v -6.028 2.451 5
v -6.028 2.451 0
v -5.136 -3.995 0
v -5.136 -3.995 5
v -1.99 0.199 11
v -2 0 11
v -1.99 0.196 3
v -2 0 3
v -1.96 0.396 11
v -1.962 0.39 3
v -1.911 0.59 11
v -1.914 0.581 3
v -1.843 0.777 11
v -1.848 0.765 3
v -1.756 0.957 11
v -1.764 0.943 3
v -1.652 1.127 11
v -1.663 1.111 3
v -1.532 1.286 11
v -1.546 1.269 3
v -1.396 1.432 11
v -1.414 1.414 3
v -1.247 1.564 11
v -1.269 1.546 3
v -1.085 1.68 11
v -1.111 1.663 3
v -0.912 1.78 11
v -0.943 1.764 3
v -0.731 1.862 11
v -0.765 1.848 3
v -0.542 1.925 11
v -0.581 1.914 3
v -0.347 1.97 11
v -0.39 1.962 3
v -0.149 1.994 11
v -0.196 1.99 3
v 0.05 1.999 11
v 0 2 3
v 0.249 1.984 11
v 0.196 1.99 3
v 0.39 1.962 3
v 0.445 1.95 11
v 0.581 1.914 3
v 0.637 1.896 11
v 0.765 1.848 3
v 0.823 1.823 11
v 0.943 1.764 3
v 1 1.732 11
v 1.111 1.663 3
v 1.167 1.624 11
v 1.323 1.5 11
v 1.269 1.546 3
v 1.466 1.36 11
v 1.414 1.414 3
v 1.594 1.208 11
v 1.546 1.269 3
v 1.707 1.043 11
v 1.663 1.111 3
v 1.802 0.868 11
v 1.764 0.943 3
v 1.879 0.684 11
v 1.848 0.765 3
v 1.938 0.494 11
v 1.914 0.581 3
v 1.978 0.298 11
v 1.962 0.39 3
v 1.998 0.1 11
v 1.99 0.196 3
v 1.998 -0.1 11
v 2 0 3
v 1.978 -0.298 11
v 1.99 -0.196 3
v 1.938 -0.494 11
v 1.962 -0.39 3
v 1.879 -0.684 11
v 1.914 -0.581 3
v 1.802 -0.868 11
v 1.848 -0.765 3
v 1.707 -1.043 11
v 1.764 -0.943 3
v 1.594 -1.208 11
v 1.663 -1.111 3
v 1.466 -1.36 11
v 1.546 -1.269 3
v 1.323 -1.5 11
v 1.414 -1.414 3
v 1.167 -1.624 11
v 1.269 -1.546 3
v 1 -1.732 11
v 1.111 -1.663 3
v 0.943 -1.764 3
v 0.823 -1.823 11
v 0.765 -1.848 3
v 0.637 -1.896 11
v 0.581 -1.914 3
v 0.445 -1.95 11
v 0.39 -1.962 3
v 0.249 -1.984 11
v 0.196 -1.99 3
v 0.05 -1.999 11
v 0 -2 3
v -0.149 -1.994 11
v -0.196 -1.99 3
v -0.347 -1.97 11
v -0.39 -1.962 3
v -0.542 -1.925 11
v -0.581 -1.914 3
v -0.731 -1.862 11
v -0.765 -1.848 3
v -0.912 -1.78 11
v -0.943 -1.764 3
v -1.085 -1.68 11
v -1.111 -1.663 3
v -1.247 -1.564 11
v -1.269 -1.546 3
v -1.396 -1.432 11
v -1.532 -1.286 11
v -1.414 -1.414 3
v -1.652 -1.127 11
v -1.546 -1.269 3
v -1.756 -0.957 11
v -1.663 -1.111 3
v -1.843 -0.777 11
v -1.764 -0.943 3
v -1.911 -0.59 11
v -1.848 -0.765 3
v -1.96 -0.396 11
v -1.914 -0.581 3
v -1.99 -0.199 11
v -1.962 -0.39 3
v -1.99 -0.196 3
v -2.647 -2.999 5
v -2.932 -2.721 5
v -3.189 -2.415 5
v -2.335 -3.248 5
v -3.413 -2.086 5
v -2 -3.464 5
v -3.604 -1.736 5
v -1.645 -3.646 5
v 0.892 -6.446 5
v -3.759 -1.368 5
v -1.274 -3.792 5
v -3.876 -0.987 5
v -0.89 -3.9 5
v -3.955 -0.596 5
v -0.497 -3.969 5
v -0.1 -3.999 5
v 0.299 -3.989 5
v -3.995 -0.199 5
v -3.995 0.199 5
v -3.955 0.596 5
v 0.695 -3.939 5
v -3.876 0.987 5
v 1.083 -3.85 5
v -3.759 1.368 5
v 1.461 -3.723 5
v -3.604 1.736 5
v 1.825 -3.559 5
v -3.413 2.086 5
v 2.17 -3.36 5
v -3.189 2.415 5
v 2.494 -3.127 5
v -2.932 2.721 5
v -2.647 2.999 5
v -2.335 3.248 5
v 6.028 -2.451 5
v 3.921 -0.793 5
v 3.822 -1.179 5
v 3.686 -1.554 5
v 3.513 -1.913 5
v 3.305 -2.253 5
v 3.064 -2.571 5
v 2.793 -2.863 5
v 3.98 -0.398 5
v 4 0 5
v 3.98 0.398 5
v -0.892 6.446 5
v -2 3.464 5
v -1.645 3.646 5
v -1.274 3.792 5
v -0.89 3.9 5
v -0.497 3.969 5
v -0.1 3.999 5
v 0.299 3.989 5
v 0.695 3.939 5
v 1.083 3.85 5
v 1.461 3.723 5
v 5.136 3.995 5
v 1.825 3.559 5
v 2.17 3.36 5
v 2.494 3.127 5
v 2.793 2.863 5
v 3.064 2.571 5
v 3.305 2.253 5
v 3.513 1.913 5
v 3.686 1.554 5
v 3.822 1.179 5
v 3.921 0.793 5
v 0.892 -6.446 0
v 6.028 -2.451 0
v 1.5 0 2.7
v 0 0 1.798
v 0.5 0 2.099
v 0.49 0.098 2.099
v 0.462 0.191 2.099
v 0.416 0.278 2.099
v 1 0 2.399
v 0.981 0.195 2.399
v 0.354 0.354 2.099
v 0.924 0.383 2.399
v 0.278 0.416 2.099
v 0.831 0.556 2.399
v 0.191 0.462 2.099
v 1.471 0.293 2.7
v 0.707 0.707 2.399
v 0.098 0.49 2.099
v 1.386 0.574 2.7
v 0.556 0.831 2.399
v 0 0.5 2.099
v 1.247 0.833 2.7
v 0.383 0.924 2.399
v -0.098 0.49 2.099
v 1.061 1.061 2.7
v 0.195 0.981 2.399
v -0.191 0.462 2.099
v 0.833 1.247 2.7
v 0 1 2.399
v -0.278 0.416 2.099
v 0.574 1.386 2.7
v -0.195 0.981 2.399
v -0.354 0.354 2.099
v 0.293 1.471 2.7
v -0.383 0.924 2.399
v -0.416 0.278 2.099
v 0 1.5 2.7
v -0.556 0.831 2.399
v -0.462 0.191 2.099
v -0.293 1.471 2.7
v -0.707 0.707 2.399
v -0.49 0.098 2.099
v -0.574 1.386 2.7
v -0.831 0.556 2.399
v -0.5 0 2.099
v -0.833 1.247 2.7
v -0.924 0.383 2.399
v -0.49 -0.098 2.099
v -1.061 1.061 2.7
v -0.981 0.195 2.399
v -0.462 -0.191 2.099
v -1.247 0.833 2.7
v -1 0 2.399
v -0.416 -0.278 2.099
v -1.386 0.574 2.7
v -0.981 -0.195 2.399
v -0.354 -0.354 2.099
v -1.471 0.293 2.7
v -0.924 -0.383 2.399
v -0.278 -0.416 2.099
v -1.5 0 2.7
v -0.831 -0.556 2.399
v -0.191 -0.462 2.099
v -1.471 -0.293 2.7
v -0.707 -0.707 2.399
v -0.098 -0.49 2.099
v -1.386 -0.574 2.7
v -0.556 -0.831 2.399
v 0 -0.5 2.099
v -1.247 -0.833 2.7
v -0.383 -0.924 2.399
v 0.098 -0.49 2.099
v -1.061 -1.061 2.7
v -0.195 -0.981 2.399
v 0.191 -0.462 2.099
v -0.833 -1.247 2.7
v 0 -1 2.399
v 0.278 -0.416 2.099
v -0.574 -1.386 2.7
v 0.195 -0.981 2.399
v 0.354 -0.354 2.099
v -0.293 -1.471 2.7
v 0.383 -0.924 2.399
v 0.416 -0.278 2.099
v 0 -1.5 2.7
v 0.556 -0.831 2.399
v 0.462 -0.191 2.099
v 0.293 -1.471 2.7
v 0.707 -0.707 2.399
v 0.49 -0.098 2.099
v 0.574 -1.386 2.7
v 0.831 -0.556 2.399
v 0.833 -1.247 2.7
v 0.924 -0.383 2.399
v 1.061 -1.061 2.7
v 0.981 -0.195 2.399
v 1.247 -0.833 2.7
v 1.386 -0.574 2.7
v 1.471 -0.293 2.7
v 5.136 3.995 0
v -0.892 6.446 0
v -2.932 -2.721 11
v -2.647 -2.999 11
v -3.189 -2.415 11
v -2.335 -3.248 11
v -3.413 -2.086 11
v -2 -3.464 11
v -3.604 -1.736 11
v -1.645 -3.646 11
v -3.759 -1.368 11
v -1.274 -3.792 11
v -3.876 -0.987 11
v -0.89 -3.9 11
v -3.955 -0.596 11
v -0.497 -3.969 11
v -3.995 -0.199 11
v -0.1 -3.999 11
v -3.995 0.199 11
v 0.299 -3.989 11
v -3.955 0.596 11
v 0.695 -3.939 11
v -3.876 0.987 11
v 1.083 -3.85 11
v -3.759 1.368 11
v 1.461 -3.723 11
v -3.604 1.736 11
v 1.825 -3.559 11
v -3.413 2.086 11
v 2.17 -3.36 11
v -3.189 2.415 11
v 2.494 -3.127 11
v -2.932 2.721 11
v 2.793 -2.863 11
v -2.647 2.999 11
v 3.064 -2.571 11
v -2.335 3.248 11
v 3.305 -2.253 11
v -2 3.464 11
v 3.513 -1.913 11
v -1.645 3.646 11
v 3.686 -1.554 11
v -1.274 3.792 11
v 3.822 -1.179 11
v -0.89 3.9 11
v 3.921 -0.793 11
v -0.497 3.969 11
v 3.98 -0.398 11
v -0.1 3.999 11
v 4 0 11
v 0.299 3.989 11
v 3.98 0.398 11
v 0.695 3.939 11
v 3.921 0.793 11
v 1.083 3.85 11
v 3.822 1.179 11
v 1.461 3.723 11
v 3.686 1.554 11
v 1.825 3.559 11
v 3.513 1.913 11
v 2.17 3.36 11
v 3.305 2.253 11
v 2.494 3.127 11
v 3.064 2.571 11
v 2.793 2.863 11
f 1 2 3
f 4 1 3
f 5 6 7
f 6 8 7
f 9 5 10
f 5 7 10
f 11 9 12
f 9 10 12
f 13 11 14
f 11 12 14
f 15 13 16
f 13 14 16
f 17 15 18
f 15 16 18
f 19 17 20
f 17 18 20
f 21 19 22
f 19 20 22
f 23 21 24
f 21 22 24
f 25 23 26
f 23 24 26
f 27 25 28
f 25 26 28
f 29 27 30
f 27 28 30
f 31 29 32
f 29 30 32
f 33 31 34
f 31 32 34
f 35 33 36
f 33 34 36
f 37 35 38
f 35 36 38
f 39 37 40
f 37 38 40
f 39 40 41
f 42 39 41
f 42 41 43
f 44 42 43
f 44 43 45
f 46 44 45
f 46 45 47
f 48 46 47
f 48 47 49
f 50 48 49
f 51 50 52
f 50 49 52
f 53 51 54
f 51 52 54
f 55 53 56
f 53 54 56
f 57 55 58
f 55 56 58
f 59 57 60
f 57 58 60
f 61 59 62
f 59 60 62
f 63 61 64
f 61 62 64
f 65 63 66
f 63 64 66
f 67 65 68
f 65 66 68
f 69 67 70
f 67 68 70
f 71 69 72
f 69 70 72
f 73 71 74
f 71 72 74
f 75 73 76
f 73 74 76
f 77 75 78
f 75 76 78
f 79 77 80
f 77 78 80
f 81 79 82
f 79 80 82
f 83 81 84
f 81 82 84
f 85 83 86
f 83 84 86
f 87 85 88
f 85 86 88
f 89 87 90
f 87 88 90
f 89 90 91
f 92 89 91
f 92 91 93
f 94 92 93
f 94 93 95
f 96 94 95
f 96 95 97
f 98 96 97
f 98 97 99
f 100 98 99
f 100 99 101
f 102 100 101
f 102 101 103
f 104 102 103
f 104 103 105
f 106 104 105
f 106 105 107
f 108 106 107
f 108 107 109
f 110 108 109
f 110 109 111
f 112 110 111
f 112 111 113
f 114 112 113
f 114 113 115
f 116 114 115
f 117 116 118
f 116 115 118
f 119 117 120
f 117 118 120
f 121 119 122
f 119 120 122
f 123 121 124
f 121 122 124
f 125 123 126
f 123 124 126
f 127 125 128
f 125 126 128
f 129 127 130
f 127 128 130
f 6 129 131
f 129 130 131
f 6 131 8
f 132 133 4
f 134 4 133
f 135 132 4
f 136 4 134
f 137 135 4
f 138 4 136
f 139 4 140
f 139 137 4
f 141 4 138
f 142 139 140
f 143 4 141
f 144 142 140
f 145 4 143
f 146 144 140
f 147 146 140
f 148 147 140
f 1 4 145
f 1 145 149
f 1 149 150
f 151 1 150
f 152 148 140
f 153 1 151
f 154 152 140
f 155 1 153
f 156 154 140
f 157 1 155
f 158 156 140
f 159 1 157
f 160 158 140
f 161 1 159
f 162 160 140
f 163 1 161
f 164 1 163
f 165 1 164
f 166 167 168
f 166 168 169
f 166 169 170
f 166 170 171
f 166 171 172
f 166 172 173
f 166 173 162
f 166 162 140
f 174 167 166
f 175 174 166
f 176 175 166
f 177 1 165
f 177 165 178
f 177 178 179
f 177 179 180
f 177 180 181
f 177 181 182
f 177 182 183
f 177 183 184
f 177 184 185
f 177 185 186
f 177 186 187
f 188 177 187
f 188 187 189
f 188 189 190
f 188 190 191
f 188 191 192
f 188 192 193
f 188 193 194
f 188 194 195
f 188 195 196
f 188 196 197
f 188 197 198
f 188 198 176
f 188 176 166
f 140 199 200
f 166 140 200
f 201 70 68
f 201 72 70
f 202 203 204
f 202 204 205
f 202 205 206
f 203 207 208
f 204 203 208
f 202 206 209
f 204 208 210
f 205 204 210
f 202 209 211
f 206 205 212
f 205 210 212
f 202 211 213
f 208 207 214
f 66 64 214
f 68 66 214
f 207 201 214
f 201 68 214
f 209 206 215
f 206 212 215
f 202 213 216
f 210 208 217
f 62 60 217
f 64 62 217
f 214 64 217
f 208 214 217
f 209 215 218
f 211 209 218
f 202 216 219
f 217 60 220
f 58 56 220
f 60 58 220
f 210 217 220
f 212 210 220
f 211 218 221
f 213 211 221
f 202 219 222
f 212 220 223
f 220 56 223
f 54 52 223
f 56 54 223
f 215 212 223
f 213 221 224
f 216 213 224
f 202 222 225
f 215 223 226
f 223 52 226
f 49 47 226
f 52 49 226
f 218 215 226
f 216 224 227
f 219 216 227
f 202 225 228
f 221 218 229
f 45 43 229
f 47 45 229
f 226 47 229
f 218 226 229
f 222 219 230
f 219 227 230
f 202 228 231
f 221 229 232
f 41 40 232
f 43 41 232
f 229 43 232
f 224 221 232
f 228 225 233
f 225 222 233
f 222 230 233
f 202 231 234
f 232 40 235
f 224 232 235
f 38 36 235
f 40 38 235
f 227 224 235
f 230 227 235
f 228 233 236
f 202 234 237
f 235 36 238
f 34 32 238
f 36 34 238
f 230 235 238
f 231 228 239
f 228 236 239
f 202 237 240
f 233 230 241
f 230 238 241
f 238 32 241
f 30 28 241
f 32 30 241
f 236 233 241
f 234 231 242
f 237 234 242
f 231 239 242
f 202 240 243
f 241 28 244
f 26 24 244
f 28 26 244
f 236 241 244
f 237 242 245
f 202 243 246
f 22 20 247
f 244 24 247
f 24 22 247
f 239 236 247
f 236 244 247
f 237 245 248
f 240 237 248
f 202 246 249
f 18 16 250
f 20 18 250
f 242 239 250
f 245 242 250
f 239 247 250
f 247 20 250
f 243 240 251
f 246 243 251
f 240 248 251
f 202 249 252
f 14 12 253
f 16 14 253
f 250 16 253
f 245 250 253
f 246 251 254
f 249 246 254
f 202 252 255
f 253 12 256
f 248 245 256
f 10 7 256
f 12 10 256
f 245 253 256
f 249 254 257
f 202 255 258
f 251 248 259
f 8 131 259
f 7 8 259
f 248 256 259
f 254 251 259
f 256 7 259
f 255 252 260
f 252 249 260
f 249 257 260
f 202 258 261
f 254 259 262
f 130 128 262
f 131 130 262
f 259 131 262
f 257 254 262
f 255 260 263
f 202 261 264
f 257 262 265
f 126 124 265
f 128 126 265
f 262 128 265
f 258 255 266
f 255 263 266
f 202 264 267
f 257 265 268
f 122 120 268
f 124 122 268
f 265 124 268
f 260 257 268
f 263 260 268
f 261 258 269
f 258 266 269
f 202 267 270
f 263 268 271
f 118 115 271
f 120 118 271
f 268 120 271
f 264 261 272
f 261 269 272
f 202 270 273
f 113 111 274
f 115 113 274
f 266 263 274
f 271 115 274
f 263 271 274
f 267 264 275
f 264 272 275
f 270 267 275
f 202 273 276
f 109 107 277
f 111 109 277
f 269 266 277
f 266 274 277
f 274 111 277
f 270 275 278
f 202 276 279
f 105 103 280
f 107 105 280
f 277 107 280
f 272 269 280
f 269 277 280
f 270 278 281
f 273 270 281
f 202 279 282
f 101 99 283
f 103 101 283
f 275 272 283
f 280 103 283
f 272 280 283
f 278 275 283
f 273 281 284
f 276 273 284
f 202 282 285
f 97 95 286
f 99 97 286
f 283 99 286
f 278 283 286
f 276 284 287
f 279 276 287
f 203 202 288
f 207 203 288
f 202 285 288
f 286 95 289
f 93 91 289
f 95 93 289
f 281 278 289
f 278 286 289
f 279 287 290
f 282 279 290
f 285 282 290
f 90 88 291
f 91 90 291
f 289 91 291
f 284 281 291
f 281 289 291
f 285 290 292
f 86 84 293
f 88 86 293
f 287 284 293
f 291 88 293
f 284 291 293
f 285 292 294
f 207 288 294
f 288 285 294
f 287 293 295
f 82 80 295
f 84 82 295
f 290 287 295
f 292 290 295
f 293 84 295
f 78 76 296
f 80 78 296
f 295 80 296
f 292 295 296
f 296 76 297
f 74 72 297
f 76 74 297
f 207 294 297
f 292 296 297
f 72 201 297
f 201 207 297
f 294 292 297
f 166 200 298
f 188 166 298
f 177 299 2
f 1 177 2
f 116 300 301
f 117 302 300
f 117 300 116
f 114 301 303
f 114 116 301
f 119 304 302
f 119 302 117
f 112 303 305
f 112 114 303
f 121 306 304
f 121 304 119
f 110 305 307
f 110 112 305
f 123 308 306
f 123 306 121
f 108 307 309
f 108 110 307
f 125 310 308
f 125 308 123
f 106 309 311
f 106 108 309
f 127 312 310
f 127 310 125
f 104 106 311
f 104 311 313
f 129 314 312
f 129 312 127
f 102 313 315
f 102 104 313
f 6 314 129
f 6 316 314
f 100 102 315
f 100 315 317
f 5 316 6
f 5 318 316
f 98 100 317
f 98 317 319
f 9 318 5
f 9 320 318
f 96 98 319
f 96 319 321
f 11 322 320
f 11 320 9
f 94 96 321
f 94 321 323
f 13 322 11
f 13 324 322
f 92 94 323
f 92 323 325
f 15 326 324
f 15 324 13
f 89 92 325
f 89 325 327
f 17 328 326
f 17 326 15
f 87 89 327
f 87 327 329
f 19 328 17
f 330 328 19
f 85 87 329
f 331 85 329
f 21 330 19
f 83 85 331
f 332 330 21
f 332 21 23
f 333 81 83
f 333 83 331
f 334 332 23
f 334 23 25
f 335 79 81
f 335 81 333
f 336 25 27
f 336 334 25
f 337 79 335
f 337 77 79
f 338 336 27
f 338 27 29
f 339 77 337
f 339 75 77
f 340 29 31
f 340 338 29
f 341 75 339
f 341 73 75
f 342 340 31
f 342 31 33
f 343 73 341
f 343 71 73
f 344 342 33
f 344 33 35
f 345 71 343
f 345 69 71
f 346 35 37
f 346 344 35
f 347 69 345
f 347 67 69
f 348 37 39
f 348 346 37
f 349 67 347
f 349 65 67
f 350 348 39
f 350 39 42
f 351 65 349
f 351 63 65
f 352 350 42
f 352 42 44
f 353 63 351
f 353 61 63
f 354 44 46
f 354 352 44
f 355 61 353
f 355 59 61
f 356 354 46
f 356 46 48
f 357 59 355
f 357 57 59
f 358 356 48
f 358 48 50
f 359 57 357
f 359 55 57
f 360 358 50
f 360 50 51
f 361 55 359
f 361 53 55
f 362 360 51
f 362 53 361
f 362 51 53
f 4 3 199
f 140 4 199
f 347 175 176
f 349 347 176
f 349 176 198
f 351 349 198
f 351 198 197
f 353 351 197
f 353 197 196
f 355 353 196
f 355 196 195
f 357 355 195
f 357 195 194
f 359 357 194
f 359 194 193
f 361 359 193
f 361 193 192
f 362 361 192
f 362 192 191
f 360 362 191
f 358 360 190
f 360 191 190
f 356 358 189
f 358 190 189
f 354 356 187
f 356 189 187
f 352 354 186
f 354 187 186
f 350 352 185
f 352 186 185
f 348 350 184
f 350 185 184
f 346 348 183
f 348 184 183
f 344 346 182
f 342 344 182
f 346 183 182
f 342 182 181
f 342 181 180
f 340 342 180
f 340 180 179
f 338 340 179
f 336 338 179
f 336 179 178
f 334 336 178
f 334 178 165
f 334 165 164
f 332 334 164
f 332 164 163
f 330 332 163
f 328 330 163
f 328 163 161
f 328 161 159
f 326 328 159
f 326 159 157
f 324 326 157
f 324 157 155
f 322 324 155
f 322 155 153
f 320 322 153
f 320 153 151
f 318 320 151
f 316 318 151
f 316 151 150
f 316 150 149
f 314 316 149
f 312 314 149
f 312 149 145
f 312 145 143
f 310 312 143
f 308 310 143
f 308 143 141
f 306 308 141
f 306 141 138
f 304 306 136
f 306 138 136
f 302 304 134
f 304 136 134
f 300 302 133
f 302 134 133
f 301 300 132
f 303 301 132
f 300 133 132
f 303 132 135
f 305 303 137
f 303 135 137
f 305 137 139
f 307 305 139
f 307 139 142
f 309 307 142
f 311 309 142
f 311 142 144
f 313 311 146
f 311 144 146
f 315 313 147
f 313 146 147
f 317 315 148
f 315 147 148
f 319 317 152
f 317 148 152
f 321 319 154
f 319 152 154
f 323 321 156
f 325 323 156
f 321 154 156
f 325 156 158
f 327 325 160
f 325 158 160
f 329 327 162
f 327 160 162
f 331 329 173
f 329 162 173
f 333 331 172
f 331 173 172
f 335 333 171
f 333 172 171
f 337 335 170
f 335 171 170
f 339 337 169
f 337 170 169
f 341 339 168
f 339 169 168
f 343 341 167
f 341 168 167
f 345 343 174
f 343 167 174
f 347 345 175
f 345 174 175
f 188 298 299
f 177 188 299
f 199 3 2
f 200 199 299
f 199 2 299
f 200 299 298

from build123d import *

# Parameters (mm, degrees)
F0_R     = 4
F1_DEPTH = 11
F3_DEPTH = 5
F6_D     = 4
F6_DEPTH = 8
F6_TIP   = 1.2017212381


with BuildPart() as f1:
    # F0 (on Top) → F1 (new body)
    with BuildSketch(Plane.XY):
        Circle(F0_R)
    extrude(amount=F1_DEPTH)

    # F2 (on Top) → F3 (join)
    with BuildSketch(Plane.XY):
        Polygon((0.8915454574, -6.4456966717), (6.0279097915, -2.4507473211), (5.1363643341, 3.9949493506), (-0.8915454574, 6.4456966717), (-6.0279097915, 2.4507473211), (-5.1363643341, -3.9949493506), align=None)
    extrude(amount=F3_DEPTH)

    # F6
    with Locations(Plane.XY.offset(11)):
        with Locations((0, 0)):
            Hole(F6_D / 2, depth=F6_DEPTH)
            with Locations((0, 0, -(F6_DEPTH + F6_TIP / 2))):  # 118° drill point
                Cone(0, F6_D / 2, F6_TIP, mode=Mode.SUBTRACT)


solid = f1.part
